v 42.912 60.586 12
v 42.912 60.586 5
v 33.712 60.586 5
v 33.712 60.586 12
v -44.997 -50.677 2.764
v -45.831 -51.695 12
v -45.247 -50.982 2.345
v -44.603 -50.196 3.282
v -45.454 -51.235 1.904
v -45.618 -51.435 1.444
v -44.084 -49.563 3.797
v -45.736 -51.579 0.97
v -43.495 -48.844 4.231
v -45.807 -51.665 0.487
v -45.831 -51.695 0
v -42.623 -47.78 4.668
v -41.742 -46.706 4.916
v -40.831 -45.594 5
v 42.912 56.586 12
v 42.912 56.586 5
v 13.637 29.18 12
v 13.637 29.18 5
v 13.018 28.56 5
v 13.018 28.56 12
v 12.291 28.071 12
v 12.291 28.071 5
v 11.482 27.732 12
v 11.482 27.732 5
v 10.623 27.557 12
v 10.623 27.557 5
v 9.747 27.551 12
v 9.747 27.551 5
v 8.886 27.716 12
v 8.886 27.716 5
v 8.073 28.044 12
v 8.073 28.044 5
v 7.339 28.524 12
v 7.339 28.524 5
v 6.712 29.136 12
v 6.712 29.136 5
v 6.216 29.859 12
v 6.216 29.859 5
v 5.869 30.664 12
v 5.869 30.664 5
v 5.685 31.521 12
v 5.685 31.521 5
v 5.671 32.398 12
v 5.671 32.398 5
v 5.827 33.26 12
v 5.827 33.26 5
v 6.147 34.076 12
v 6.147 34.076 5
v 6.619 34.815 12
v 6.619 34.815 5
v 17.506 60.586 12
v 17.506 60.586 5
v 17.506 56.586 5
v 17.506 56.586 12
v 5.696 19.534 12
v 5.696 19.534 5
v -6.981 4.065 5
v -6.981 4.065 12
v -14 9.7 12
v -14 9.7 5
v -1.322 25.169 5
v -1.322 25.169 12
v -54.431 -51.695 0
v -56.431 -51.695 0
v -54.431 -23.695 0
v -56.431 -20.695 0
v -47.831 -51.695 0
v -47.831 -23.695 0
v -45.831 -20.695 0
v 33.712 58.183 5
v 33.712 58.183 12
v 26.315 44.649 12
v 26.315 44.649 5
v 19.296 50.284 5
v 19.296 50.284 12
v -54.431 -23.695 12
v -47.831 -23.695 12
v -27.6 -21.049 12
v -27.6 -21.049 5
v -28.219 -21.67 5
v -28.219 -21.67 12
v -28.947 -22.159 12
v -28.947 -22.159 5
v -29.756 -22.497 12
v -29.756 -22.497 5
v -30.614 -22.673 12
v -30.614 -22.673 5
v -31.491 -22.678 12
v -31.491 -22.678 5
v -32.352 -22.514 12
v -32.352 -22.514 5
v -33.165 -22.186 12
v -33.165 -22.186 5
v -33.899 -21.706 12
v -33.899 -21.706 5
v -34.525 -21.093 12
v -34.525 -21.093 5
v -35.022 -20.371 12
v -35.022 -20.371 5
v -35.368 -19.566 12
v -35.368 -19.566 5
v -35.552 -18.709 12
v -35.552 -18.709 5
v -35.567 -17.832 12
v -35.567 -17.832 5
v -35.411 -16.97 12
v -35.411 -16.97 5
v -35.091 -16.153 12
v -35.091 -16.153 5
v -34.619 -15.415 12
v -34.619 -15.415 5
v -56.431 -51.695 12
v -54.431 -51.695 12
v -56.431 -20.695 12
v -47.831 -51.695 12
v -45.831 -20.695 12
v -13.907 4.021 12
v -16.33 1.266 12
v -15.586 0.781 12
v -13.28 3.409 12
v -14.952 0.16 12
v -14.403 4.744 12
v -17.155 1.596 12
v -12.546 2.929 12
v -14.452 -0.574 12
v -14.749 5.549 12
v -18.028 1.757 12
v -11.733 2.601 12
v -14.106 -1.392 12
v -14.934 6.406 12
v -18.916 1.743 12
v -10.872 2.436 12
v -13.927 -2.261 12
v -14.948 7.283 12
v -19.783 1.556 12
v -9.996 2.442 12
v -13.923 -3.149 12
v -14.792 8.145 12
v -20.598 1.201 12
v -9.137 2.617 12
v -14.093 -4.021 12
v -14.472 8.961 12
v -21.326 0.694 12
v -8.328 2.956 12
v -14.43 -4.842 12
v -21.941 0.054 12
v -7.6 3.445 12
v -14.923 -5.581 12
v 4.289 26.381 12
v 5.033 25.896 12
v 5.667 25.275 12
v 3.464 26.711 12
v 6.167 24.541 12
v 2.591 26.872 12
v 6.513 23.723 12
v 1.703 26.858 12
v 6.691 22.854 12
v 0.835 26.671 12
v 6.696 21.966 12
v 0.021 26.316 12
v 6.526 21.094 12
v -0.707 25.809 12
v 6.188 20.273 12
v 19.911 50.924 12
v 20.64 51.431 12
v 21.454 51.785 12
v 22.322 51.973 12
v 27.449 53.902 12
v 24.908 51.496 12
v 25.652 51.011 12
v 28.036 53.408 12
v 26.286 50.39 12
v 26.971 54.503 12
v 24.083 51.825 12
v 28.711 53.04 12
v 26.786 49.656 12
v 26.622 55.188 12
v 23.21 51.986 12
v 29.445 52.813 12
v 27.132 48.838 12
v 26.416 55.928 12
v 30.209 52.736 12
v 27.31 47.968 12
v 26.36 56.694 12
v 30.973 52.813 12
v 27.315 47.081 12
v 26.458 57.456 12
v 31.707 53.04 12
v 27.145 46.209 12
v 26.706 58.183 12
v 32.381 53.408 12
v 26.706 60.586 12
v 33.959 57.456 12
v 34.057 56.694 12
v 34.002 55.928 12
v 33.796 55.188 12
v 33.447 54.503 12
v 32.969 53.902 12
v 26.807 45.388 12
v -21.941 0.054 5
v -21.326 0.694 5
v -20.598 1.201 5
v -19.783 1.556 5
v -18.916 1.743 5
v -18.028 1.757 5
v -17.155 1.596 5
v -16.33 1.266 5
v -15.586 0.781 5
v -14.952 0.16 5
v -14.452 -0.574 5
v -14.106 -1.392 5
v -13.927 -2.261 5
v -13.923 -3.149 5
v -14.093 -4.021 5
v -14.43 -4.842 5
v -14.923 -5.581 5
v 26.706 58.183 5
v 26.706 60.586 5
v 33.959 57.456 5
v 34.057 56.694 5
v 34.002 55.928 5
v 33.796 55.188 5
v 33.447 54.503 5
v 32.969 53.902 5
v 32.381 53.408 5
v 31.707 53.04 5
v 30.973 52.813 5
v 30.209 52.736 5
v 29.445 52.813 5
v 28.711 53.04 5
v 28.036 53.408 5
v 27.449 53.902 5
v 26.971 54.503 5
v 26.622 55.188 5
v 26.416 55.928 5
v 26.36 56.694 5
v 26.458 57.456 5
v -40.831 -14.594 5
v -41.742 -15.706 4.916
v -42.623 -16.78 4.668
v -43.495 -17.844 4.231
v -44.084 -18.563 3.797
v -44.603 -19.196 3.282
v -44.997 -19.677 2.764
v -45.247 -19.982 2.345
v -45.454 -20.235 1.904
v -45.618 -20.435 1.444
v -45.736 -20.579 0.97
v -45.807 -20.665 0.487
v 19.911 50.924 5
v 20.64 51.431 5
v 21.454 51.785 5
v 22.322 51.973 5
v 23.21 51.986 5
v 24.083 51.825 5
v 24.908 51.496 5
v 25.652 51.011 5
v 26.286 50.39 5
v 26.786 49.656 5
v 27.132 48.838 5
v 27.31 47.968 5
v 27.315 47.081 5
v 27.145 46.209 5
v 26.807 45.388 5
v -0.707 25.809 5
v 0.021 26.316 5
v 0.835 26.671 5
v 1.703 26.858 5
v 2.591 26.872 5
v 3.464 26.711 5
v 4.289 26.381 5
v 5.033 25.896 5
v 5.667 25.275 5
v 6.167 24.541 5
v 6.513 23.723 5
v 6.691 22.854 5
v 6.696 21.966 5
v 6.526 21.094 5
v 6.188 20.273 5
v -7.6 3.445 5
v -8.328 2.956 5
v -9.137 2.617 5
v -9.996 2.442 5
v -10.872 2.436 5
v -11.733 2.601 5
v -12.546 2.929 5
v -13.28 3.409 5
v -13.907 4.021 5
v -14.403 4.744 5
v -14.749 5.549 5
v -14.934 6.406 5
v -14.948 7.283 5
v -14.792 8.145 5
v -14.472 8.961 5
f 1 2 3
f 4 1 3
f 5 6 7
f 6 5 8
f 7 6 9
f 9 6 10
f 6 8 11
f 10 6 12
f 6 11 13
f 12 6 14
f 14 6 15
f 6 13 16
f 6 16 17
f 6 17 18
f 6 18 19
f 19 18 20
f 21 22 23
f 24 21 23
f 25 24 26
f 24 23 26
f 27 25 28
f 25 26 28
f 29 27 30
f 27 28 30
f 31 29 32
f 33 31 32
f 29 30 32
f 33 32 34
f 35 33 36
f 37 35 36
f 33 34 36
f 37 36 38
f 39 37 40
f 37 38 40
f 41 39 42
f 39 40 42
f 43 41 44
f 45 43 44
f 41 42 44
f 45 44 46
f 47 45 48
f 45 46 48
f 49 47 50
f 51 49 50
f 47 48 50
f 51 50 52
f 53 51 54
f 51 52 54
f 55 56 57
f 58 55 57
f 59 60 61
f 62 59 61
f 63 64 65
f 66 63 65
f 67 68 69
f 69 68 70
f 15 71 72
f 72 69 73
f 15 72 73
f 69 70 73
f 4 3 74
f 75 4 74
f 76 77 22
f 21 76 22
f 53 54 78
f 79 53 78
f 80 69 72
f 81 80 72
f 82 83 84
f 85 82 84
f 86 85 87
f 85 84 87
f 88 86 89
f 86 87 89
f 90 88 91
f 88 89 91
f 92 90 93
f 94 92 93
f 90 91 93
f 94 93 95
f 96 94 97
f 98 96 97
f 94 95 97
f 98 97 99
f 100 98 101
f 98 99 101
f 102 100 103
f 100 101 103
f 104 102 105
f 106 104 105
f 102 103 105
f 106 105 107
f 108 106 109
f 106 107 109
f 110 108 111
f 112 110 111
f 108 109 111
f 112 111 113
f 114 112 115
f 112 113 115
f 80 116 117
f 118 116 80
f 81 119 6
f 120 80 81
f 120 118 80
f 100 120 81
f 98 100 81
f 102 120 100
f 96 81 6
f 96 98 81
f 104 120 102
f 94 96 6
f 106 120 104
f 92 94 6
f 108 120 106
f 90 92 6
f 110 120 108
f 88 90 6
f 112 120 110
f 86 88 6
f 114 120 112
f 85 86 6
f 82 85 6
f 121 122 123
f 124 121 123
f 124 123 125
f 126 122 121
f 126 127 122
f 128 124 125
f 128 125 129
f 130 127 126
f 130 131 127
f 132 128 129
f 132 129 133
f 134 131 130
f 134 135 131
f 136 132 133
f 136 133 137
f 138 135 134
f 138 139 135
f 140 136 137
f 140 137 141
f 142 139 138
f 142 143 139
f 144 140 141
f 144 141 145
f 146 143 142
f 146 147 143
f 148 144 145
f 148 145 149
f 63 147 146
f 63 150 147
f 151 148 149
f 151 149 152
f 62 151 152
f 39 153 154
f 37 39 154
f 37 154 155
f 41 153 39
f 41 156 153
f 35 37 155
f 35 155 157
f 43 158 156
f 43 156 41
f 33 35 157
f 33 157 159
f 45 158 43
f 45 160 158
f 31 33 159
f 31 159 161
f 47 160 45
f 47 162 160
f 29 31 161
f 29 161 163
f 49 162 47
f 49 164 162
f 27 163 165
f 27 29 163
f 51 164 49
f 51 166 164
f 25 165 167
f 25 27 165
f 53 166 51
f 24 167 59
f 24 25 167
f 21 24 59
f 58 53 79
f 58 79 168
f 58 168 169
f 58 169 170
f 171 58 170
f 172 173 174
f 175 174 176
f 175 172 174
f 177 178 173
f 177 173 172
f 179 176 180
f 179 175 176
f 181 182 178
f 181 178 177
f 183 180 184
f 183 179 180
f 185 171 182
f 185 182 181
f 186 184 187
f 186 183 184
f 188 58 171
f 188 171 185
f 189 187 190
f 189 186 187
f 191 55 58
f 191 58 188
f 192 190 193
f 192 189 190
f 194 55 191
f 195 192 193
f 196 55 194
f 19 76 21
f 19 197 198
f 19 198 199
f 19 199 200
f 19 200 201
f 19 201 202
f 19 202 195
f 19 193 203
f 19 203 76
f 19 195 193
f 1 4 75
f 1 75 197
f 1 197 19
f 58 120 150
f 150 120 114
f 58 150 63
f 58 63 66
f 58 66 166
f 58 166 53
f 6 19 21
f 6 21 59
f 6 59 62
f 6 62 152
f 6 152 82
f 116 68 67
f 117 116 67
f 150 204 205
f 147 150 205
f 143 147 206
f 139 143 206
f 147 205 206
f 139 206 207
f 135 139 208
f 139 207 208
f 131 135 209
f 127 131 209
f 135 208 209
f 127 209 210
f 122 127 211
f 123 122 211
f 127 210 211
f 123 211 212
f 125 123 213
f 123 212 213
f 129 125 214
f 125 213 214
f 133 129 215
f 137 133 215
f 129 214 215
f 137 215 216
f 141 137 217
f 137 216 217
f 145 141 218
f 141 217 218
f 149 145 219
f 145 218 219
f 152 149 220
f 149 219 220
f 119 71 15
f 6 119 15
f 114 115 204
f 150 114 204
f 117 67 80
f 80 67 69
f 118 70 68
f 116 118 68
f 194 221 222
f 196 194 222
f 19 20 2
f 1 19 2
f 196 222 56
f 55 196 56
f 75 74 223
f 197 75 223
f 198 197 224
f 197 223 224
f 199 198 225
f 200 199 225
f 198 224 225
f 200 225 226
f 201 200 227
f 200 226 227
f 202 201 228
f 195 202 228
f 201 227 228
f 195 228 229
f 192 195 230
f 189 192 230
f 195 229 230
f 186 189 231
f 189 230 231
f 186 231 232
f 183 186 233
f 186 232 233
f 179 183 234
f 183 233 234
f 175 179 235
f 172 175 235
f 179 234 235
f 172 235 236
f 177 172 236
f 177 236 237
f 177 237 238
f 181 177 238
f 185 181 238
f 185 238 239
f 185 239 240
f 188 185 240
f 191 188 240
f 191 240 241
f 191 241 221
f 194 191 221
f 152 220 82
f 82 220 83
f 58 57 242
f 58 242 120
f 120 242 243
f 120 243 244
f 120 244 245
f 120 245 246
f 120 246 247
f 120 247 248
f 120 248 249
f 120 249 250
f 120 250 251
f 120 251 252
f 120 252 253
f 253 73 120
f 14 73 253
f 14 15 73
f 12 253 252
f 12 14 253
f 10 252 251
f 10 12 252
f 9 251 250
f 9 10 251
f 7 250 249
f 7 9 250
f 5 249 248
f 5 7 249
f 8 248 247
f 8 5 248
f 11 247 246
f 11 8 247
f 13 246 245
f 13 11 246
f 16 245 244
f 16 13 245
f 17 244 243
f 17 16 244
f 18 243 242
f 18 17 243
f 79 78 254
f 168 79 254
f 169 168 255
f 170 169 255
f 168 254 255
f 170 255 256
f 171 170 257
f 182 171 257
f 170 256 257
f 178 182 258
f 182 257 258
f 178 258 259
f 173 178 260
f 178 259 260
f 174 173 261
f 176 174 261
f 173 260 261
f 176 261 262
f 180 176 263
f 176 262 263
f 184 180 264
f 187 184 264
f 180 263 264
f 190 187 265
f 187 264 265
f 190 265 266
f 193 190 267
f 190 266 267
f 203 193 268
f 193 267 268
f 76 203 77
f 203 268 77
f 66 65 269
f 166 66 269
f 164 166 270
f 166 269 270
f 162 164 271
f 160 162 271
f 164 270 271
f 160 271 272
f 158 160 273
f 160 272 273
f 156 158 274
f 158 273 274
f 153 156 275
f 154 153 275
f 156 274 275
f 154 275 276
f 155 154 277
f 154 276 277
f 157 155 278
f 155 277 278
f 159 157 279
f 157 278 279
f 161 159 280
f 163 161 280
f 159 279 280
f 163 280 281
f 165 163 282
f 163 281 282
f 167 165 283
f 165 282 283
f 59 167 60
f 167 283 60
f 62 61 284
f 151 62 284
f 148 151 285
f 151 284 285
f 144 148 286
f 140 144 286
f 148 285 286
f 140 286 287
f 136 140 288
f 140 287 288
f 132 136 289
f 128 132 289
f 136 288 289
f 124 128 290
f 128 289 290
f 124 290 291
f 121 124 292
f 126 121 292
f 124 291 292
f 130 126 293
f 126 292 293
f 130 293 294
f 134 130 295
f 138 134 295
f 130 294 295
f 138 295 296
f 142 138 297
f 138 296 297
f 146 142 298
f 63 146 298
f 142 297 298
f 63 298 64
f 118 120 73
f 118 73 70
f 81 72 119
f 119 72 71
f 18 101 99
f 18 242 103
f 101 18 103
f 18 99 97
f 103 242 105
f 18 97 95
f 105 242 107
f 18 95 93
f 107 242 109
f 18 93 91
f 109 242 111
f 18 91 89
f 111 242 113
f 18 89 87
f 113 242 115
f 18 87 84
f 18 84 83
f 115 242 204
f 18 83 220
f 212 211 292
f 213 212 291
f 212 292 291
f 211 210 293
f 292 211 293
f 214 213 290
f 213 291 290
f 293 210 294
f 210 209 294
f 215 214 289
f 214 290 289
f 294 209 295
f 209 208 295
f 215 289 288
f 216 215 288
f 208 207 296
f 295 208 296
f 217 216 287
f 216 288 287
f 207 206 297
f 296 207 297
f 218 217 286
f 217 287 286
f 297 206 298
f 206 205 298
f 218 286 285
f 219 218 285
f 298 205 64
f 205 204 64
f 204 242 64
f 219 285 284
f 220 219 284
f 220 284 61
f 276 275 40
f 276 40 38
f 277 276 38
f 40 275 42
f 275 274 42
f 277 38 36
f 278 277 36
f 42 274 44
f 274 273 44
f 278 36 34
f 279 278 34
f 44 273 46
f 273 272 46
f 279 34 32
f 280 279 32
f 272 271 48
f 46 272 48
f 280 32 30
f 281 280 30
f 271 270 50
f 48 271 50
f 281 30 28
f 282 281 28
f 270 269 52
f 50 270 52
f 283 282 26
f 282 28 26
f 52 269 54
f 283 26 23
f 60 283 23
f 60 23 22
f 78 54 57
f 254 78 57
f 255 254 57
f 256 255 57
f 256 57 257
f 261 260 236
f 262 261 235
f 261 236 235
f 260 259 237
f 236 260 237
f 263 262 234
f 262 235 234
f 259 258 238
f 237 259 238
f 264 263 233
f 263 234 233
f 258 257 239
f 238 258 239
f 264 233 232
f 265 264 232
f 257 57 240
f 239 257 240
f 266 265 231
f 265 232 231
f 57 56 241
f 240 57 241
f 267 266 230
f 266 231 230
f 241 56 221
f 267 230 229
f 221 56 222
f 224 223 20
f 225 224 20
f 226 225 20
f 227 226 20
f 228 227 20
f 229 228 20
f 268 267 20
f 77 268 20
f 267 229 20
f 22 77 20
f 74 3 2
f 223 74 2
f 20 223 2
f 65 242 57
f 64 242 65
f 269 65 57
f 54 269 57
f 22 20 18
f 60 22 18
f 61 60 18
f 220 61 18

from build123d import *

# Parameters (mm, degrees)
F1_DEPTH = 12
F2_DEPTH = 25
F3_DEPTH = 5
F4_R     = 4.99999


# Not quite as in the source:
# - a fillet or chamfer is up to 0.001 mm smaller than in the source, because OpenCascade refuses the exact size


with BuildPart() as f1:
    # F0 (on Top) → F1 (new body)
    with BuildSketch(Plane.XY):
        with BuildLine():
            Line((-45.8308390021, -20.6945241443), (-45.8308390021, -51.6945241443))
            Line((-45.8308390021, -51.6945241443), (42.9120542584, 56.586124615))
            Line((42.9120542584, 56.586124615), (42.9120542584, 60.586124615))
            Line((42.9120542584, 60.586124615), (33.7120542584, 60.586124615))
            Line((33.7120542584, 60.586124615), (33.7120542584, 58.1829414275))
            ThreePointArc((33.7120542584, 58.1829414275), (30.2088163179, 52.736124615), (26.7055783775, 58.1829414275))
            Line((26.7055783775, 58.1829414275), (26.7055783775, 60.586124615))
            Line((26.7055783775, 60.586124615), (17.5055783775, 60.586124615))
            Line((17.5055783775, 60.586124615), (17.5055783775, 56.586124615))
            Line((17.5055783775, 56.586124615), (-45.8308390021, -20.6945241443))
        make_face()
        with BuildLine():
            ThreePointArc((-27.6003750582, -21.0494093167), (-33.898601194, -21.7061227773), (-34.6189265027, -15.4148545048))
            Line((-34.6189265027, -15.4148545048), (-21.9413703226, 0.0538096037))
            ThreePointArc((-21.9413703226, 0.0538096037), (-15.5862024886, 0.7814511592), (-14.9228188782, -5.5807452082))
            Line((-14.9228188782, -5.5807452082), (-27.6003750582, -21.0494093167))
        make_face(mode=Mode.SUBTRACT)
        with BuildLine():
            ThreePointArc((-6.9814485555, 4.0654451881), (-13.2796746913, 3.4087317275), (-14, 9.7))
            Line((-14, 9.7), (-1.3224438199, 25.1686641085))
            ThreePointArc((-1.3224438199, 25.1686641085), (5.0327240141, 25.896305664), (5.6961076246, 19.5341092966))
            Line((5.6961076246, 19.5341092966), (-6.9814485555, 4.0654451881))
        make_face(mode=Mode.SUBTRACT)
        with BuildLine():
            ThreePointArc((13.6374779472, 29.1802996929), (7.3392518114, 28.5235862323), (6.6189265027, 34.8148545048))
            Line((6.6189265027, 34.8148545048), (19.2964826828, 50.2835186133))
            ThreePointArc((19.2964826828, 50.2835186133), (25.6516505168, 51.0111601688), (26.3150341273, 44.6489638014))
            Line((26.3150341273, 44.6489638014), (13.6374779472, 29.1802996929))
        make_face(mode=Mode.SUBTRACT)
        Polygon((-54.4308390021, -51.6945241443), (-54.4308390021, -23.6945241443), (-47.8308390021, -23.6945241443), (-47.8308390021, -51.6945241443), (-45.8308390021, -51.6945241443), (-45.8308390021, -20.6945241443), (-56.4308390021, -20.6945241443), (-56.4308390021, -51.6945241443), align=None)
    extrude(amount=F1_DEPTH)

    # F0 (on Top) → F2 (cut)
    with BuildSketch(Plane.XY):
        with BuildLine():
            Line((-21.9413703226, 0.0538096037), (-34.6189265027, -15.4148545048))
            ThreePointArc((-34.6189265027, -15.4148545048), (-33.898601194, -21.7061227773), (-27.6003750582, -21.0494093167))
            Line((-27.6003750582, -21.0494093167), (-14.9228188782, -5.5807452082))
            ThreePointArc((-14.9228188782, -5.5807452082), (-15.5862024886, 0.7814511592), (-21.9413703226, 0.0538096037))
        make_face()
        with BuildLine():
            Line((-1.3224438199, 25.1686641085), (-14, 9.7))
            ThreePointArc((-14, 9.7), (-13.2796746913, 3.4087317275), (-6.9814485555, 4.0654451881))
            Line((-6.9814485555, 4.0654451881), (5.6961076246, 19.5341092966))
            ThreePointArc((5.6961076246, 19.5341092966), (5.0327240141, 25.896305664), (-1.3224438199, 25.1686641085))
        make_face()
        with BuildLine():
            Line((19.2964826828, 50.2835186133), (6.6189265027, 34.8148545048))
            ThreePointArc((6.6189265027, 34.8148545048), (7.3392518114, 28.5235862323), (13.6374779472, 29.1802996929))
            Line((13.6374779472, 29.1802996929), (26.3150341273, 44.6489638014))
            ThreePointArc((26.3150341273, 44.6489638014), (25.6516505168, 51.0111601688), (19.2964826828, 50.2835186133))
        make_face()
    extrude(amount=-F2_DEPTH, mode=Mode.SUBTRACT)

    # F0 (on Top) → F3 (cut)
    with BuildSketch(Plane.XY):
        with BuildLine():
            Line((-45.8308390021, -20.6945241443), (-45.8308390021, -51.6945241443))
            Line((-45.8308390021, -51.6945241443), (42.9120542584, 56.586124615))
            Line((42.9120542584, 56.586124615), (42.9120542584, 60.586124615))
            Line((42.9120542584, 60.586124615), (33.7120542584, 60.586124615))
            Line((33.7120542584, 60.586124615), (33.7120542584, 58.1829414275))
            ThreePointArc((33.7120542584, 58.1829414275), (30.2088163179, 52.736124615), (26.7055783775, 58.1829414275))
            Line((26.7055783775, 58.1829414275), (26.7055783775, 60.586124615))
            Line((26.7055783775, 60.586124615), (17.5055783775, 60.586124615))
            Line((17.5055783775, 60.586124615), (17.5055783775, 56.586124615))
            Line((17.5055783775, 56.586124615), (-45.8308390021, -20.6945241443))
        make_face()
        with BuildLine():
            ThreePointArc((-27.6003750582, -21.0494093167), (-33.898601194, -21.7061227773), (-34.6189265027, -15.4148545048))
            Line((-34.6189265027, -15.4148545048), (-21.9413703226, 0.0538096037))
            ThreePointArc((-21.9413703226, 0.0538096037), (-15.5862024886, 0.7814511592), (-14.9228188782, -5.5807452082))
            Line((-14.9228188782, -5.5807452082), (-27.6003750582, -21.0494093167))
        make_face(mode=Mode.SUBTRACT)
        with BuildLine():
            ThreePointArc((-6.9814485555, 4.0654451881), (-13.2796746913, 3.4087317275), (-14, 9.7))
            Line((-14, 9.7), (-1.3224438199, 25.1686641085))
            ThreePointArc((-1.3224438199, 25.1686641085), (5.0327240141, 25.896305664), (5.6961076246, 19.5341092966))
            Line((5.6961076246, 19.5341092966), (-6.9814485555, 4.0654451881))
        make_face(mode=Mode.SUBTRACT)
        with BuildLine():
            ThreePointArc((13.6374779472, 29.1802996929), (7.3392518114, 28.5235862323), (6.6189265027, 34.8148545048))
            Line((6.6189265027, 34.8148545048), (19.2964826828, 50.2835186133))
            ThreePointArc((19.2964826828, 50.2835186133), (25.6516505168, 51.0111601688), (26.3150341273, 44.6489638014))
            Line((26.3150341273, 44.6489638014), (13.6374779472, 29.1802996929))
        make_face(mode=Mode.SUBTRACT)
    extrude(amount=F3_DEPTH, mode=Mode.SUBTRACT)

    # F4 (radius 5 in the source; OpenCascade refuses exactly that, so slightly less here)
    f4_edges = [f1.edges().sort_by_distance(p)[0] for p in [
        (-45.830839, -36.194524, 5),
    ]]
    fillet(f4_edges, radius=F4_R)


solid = f1.part
